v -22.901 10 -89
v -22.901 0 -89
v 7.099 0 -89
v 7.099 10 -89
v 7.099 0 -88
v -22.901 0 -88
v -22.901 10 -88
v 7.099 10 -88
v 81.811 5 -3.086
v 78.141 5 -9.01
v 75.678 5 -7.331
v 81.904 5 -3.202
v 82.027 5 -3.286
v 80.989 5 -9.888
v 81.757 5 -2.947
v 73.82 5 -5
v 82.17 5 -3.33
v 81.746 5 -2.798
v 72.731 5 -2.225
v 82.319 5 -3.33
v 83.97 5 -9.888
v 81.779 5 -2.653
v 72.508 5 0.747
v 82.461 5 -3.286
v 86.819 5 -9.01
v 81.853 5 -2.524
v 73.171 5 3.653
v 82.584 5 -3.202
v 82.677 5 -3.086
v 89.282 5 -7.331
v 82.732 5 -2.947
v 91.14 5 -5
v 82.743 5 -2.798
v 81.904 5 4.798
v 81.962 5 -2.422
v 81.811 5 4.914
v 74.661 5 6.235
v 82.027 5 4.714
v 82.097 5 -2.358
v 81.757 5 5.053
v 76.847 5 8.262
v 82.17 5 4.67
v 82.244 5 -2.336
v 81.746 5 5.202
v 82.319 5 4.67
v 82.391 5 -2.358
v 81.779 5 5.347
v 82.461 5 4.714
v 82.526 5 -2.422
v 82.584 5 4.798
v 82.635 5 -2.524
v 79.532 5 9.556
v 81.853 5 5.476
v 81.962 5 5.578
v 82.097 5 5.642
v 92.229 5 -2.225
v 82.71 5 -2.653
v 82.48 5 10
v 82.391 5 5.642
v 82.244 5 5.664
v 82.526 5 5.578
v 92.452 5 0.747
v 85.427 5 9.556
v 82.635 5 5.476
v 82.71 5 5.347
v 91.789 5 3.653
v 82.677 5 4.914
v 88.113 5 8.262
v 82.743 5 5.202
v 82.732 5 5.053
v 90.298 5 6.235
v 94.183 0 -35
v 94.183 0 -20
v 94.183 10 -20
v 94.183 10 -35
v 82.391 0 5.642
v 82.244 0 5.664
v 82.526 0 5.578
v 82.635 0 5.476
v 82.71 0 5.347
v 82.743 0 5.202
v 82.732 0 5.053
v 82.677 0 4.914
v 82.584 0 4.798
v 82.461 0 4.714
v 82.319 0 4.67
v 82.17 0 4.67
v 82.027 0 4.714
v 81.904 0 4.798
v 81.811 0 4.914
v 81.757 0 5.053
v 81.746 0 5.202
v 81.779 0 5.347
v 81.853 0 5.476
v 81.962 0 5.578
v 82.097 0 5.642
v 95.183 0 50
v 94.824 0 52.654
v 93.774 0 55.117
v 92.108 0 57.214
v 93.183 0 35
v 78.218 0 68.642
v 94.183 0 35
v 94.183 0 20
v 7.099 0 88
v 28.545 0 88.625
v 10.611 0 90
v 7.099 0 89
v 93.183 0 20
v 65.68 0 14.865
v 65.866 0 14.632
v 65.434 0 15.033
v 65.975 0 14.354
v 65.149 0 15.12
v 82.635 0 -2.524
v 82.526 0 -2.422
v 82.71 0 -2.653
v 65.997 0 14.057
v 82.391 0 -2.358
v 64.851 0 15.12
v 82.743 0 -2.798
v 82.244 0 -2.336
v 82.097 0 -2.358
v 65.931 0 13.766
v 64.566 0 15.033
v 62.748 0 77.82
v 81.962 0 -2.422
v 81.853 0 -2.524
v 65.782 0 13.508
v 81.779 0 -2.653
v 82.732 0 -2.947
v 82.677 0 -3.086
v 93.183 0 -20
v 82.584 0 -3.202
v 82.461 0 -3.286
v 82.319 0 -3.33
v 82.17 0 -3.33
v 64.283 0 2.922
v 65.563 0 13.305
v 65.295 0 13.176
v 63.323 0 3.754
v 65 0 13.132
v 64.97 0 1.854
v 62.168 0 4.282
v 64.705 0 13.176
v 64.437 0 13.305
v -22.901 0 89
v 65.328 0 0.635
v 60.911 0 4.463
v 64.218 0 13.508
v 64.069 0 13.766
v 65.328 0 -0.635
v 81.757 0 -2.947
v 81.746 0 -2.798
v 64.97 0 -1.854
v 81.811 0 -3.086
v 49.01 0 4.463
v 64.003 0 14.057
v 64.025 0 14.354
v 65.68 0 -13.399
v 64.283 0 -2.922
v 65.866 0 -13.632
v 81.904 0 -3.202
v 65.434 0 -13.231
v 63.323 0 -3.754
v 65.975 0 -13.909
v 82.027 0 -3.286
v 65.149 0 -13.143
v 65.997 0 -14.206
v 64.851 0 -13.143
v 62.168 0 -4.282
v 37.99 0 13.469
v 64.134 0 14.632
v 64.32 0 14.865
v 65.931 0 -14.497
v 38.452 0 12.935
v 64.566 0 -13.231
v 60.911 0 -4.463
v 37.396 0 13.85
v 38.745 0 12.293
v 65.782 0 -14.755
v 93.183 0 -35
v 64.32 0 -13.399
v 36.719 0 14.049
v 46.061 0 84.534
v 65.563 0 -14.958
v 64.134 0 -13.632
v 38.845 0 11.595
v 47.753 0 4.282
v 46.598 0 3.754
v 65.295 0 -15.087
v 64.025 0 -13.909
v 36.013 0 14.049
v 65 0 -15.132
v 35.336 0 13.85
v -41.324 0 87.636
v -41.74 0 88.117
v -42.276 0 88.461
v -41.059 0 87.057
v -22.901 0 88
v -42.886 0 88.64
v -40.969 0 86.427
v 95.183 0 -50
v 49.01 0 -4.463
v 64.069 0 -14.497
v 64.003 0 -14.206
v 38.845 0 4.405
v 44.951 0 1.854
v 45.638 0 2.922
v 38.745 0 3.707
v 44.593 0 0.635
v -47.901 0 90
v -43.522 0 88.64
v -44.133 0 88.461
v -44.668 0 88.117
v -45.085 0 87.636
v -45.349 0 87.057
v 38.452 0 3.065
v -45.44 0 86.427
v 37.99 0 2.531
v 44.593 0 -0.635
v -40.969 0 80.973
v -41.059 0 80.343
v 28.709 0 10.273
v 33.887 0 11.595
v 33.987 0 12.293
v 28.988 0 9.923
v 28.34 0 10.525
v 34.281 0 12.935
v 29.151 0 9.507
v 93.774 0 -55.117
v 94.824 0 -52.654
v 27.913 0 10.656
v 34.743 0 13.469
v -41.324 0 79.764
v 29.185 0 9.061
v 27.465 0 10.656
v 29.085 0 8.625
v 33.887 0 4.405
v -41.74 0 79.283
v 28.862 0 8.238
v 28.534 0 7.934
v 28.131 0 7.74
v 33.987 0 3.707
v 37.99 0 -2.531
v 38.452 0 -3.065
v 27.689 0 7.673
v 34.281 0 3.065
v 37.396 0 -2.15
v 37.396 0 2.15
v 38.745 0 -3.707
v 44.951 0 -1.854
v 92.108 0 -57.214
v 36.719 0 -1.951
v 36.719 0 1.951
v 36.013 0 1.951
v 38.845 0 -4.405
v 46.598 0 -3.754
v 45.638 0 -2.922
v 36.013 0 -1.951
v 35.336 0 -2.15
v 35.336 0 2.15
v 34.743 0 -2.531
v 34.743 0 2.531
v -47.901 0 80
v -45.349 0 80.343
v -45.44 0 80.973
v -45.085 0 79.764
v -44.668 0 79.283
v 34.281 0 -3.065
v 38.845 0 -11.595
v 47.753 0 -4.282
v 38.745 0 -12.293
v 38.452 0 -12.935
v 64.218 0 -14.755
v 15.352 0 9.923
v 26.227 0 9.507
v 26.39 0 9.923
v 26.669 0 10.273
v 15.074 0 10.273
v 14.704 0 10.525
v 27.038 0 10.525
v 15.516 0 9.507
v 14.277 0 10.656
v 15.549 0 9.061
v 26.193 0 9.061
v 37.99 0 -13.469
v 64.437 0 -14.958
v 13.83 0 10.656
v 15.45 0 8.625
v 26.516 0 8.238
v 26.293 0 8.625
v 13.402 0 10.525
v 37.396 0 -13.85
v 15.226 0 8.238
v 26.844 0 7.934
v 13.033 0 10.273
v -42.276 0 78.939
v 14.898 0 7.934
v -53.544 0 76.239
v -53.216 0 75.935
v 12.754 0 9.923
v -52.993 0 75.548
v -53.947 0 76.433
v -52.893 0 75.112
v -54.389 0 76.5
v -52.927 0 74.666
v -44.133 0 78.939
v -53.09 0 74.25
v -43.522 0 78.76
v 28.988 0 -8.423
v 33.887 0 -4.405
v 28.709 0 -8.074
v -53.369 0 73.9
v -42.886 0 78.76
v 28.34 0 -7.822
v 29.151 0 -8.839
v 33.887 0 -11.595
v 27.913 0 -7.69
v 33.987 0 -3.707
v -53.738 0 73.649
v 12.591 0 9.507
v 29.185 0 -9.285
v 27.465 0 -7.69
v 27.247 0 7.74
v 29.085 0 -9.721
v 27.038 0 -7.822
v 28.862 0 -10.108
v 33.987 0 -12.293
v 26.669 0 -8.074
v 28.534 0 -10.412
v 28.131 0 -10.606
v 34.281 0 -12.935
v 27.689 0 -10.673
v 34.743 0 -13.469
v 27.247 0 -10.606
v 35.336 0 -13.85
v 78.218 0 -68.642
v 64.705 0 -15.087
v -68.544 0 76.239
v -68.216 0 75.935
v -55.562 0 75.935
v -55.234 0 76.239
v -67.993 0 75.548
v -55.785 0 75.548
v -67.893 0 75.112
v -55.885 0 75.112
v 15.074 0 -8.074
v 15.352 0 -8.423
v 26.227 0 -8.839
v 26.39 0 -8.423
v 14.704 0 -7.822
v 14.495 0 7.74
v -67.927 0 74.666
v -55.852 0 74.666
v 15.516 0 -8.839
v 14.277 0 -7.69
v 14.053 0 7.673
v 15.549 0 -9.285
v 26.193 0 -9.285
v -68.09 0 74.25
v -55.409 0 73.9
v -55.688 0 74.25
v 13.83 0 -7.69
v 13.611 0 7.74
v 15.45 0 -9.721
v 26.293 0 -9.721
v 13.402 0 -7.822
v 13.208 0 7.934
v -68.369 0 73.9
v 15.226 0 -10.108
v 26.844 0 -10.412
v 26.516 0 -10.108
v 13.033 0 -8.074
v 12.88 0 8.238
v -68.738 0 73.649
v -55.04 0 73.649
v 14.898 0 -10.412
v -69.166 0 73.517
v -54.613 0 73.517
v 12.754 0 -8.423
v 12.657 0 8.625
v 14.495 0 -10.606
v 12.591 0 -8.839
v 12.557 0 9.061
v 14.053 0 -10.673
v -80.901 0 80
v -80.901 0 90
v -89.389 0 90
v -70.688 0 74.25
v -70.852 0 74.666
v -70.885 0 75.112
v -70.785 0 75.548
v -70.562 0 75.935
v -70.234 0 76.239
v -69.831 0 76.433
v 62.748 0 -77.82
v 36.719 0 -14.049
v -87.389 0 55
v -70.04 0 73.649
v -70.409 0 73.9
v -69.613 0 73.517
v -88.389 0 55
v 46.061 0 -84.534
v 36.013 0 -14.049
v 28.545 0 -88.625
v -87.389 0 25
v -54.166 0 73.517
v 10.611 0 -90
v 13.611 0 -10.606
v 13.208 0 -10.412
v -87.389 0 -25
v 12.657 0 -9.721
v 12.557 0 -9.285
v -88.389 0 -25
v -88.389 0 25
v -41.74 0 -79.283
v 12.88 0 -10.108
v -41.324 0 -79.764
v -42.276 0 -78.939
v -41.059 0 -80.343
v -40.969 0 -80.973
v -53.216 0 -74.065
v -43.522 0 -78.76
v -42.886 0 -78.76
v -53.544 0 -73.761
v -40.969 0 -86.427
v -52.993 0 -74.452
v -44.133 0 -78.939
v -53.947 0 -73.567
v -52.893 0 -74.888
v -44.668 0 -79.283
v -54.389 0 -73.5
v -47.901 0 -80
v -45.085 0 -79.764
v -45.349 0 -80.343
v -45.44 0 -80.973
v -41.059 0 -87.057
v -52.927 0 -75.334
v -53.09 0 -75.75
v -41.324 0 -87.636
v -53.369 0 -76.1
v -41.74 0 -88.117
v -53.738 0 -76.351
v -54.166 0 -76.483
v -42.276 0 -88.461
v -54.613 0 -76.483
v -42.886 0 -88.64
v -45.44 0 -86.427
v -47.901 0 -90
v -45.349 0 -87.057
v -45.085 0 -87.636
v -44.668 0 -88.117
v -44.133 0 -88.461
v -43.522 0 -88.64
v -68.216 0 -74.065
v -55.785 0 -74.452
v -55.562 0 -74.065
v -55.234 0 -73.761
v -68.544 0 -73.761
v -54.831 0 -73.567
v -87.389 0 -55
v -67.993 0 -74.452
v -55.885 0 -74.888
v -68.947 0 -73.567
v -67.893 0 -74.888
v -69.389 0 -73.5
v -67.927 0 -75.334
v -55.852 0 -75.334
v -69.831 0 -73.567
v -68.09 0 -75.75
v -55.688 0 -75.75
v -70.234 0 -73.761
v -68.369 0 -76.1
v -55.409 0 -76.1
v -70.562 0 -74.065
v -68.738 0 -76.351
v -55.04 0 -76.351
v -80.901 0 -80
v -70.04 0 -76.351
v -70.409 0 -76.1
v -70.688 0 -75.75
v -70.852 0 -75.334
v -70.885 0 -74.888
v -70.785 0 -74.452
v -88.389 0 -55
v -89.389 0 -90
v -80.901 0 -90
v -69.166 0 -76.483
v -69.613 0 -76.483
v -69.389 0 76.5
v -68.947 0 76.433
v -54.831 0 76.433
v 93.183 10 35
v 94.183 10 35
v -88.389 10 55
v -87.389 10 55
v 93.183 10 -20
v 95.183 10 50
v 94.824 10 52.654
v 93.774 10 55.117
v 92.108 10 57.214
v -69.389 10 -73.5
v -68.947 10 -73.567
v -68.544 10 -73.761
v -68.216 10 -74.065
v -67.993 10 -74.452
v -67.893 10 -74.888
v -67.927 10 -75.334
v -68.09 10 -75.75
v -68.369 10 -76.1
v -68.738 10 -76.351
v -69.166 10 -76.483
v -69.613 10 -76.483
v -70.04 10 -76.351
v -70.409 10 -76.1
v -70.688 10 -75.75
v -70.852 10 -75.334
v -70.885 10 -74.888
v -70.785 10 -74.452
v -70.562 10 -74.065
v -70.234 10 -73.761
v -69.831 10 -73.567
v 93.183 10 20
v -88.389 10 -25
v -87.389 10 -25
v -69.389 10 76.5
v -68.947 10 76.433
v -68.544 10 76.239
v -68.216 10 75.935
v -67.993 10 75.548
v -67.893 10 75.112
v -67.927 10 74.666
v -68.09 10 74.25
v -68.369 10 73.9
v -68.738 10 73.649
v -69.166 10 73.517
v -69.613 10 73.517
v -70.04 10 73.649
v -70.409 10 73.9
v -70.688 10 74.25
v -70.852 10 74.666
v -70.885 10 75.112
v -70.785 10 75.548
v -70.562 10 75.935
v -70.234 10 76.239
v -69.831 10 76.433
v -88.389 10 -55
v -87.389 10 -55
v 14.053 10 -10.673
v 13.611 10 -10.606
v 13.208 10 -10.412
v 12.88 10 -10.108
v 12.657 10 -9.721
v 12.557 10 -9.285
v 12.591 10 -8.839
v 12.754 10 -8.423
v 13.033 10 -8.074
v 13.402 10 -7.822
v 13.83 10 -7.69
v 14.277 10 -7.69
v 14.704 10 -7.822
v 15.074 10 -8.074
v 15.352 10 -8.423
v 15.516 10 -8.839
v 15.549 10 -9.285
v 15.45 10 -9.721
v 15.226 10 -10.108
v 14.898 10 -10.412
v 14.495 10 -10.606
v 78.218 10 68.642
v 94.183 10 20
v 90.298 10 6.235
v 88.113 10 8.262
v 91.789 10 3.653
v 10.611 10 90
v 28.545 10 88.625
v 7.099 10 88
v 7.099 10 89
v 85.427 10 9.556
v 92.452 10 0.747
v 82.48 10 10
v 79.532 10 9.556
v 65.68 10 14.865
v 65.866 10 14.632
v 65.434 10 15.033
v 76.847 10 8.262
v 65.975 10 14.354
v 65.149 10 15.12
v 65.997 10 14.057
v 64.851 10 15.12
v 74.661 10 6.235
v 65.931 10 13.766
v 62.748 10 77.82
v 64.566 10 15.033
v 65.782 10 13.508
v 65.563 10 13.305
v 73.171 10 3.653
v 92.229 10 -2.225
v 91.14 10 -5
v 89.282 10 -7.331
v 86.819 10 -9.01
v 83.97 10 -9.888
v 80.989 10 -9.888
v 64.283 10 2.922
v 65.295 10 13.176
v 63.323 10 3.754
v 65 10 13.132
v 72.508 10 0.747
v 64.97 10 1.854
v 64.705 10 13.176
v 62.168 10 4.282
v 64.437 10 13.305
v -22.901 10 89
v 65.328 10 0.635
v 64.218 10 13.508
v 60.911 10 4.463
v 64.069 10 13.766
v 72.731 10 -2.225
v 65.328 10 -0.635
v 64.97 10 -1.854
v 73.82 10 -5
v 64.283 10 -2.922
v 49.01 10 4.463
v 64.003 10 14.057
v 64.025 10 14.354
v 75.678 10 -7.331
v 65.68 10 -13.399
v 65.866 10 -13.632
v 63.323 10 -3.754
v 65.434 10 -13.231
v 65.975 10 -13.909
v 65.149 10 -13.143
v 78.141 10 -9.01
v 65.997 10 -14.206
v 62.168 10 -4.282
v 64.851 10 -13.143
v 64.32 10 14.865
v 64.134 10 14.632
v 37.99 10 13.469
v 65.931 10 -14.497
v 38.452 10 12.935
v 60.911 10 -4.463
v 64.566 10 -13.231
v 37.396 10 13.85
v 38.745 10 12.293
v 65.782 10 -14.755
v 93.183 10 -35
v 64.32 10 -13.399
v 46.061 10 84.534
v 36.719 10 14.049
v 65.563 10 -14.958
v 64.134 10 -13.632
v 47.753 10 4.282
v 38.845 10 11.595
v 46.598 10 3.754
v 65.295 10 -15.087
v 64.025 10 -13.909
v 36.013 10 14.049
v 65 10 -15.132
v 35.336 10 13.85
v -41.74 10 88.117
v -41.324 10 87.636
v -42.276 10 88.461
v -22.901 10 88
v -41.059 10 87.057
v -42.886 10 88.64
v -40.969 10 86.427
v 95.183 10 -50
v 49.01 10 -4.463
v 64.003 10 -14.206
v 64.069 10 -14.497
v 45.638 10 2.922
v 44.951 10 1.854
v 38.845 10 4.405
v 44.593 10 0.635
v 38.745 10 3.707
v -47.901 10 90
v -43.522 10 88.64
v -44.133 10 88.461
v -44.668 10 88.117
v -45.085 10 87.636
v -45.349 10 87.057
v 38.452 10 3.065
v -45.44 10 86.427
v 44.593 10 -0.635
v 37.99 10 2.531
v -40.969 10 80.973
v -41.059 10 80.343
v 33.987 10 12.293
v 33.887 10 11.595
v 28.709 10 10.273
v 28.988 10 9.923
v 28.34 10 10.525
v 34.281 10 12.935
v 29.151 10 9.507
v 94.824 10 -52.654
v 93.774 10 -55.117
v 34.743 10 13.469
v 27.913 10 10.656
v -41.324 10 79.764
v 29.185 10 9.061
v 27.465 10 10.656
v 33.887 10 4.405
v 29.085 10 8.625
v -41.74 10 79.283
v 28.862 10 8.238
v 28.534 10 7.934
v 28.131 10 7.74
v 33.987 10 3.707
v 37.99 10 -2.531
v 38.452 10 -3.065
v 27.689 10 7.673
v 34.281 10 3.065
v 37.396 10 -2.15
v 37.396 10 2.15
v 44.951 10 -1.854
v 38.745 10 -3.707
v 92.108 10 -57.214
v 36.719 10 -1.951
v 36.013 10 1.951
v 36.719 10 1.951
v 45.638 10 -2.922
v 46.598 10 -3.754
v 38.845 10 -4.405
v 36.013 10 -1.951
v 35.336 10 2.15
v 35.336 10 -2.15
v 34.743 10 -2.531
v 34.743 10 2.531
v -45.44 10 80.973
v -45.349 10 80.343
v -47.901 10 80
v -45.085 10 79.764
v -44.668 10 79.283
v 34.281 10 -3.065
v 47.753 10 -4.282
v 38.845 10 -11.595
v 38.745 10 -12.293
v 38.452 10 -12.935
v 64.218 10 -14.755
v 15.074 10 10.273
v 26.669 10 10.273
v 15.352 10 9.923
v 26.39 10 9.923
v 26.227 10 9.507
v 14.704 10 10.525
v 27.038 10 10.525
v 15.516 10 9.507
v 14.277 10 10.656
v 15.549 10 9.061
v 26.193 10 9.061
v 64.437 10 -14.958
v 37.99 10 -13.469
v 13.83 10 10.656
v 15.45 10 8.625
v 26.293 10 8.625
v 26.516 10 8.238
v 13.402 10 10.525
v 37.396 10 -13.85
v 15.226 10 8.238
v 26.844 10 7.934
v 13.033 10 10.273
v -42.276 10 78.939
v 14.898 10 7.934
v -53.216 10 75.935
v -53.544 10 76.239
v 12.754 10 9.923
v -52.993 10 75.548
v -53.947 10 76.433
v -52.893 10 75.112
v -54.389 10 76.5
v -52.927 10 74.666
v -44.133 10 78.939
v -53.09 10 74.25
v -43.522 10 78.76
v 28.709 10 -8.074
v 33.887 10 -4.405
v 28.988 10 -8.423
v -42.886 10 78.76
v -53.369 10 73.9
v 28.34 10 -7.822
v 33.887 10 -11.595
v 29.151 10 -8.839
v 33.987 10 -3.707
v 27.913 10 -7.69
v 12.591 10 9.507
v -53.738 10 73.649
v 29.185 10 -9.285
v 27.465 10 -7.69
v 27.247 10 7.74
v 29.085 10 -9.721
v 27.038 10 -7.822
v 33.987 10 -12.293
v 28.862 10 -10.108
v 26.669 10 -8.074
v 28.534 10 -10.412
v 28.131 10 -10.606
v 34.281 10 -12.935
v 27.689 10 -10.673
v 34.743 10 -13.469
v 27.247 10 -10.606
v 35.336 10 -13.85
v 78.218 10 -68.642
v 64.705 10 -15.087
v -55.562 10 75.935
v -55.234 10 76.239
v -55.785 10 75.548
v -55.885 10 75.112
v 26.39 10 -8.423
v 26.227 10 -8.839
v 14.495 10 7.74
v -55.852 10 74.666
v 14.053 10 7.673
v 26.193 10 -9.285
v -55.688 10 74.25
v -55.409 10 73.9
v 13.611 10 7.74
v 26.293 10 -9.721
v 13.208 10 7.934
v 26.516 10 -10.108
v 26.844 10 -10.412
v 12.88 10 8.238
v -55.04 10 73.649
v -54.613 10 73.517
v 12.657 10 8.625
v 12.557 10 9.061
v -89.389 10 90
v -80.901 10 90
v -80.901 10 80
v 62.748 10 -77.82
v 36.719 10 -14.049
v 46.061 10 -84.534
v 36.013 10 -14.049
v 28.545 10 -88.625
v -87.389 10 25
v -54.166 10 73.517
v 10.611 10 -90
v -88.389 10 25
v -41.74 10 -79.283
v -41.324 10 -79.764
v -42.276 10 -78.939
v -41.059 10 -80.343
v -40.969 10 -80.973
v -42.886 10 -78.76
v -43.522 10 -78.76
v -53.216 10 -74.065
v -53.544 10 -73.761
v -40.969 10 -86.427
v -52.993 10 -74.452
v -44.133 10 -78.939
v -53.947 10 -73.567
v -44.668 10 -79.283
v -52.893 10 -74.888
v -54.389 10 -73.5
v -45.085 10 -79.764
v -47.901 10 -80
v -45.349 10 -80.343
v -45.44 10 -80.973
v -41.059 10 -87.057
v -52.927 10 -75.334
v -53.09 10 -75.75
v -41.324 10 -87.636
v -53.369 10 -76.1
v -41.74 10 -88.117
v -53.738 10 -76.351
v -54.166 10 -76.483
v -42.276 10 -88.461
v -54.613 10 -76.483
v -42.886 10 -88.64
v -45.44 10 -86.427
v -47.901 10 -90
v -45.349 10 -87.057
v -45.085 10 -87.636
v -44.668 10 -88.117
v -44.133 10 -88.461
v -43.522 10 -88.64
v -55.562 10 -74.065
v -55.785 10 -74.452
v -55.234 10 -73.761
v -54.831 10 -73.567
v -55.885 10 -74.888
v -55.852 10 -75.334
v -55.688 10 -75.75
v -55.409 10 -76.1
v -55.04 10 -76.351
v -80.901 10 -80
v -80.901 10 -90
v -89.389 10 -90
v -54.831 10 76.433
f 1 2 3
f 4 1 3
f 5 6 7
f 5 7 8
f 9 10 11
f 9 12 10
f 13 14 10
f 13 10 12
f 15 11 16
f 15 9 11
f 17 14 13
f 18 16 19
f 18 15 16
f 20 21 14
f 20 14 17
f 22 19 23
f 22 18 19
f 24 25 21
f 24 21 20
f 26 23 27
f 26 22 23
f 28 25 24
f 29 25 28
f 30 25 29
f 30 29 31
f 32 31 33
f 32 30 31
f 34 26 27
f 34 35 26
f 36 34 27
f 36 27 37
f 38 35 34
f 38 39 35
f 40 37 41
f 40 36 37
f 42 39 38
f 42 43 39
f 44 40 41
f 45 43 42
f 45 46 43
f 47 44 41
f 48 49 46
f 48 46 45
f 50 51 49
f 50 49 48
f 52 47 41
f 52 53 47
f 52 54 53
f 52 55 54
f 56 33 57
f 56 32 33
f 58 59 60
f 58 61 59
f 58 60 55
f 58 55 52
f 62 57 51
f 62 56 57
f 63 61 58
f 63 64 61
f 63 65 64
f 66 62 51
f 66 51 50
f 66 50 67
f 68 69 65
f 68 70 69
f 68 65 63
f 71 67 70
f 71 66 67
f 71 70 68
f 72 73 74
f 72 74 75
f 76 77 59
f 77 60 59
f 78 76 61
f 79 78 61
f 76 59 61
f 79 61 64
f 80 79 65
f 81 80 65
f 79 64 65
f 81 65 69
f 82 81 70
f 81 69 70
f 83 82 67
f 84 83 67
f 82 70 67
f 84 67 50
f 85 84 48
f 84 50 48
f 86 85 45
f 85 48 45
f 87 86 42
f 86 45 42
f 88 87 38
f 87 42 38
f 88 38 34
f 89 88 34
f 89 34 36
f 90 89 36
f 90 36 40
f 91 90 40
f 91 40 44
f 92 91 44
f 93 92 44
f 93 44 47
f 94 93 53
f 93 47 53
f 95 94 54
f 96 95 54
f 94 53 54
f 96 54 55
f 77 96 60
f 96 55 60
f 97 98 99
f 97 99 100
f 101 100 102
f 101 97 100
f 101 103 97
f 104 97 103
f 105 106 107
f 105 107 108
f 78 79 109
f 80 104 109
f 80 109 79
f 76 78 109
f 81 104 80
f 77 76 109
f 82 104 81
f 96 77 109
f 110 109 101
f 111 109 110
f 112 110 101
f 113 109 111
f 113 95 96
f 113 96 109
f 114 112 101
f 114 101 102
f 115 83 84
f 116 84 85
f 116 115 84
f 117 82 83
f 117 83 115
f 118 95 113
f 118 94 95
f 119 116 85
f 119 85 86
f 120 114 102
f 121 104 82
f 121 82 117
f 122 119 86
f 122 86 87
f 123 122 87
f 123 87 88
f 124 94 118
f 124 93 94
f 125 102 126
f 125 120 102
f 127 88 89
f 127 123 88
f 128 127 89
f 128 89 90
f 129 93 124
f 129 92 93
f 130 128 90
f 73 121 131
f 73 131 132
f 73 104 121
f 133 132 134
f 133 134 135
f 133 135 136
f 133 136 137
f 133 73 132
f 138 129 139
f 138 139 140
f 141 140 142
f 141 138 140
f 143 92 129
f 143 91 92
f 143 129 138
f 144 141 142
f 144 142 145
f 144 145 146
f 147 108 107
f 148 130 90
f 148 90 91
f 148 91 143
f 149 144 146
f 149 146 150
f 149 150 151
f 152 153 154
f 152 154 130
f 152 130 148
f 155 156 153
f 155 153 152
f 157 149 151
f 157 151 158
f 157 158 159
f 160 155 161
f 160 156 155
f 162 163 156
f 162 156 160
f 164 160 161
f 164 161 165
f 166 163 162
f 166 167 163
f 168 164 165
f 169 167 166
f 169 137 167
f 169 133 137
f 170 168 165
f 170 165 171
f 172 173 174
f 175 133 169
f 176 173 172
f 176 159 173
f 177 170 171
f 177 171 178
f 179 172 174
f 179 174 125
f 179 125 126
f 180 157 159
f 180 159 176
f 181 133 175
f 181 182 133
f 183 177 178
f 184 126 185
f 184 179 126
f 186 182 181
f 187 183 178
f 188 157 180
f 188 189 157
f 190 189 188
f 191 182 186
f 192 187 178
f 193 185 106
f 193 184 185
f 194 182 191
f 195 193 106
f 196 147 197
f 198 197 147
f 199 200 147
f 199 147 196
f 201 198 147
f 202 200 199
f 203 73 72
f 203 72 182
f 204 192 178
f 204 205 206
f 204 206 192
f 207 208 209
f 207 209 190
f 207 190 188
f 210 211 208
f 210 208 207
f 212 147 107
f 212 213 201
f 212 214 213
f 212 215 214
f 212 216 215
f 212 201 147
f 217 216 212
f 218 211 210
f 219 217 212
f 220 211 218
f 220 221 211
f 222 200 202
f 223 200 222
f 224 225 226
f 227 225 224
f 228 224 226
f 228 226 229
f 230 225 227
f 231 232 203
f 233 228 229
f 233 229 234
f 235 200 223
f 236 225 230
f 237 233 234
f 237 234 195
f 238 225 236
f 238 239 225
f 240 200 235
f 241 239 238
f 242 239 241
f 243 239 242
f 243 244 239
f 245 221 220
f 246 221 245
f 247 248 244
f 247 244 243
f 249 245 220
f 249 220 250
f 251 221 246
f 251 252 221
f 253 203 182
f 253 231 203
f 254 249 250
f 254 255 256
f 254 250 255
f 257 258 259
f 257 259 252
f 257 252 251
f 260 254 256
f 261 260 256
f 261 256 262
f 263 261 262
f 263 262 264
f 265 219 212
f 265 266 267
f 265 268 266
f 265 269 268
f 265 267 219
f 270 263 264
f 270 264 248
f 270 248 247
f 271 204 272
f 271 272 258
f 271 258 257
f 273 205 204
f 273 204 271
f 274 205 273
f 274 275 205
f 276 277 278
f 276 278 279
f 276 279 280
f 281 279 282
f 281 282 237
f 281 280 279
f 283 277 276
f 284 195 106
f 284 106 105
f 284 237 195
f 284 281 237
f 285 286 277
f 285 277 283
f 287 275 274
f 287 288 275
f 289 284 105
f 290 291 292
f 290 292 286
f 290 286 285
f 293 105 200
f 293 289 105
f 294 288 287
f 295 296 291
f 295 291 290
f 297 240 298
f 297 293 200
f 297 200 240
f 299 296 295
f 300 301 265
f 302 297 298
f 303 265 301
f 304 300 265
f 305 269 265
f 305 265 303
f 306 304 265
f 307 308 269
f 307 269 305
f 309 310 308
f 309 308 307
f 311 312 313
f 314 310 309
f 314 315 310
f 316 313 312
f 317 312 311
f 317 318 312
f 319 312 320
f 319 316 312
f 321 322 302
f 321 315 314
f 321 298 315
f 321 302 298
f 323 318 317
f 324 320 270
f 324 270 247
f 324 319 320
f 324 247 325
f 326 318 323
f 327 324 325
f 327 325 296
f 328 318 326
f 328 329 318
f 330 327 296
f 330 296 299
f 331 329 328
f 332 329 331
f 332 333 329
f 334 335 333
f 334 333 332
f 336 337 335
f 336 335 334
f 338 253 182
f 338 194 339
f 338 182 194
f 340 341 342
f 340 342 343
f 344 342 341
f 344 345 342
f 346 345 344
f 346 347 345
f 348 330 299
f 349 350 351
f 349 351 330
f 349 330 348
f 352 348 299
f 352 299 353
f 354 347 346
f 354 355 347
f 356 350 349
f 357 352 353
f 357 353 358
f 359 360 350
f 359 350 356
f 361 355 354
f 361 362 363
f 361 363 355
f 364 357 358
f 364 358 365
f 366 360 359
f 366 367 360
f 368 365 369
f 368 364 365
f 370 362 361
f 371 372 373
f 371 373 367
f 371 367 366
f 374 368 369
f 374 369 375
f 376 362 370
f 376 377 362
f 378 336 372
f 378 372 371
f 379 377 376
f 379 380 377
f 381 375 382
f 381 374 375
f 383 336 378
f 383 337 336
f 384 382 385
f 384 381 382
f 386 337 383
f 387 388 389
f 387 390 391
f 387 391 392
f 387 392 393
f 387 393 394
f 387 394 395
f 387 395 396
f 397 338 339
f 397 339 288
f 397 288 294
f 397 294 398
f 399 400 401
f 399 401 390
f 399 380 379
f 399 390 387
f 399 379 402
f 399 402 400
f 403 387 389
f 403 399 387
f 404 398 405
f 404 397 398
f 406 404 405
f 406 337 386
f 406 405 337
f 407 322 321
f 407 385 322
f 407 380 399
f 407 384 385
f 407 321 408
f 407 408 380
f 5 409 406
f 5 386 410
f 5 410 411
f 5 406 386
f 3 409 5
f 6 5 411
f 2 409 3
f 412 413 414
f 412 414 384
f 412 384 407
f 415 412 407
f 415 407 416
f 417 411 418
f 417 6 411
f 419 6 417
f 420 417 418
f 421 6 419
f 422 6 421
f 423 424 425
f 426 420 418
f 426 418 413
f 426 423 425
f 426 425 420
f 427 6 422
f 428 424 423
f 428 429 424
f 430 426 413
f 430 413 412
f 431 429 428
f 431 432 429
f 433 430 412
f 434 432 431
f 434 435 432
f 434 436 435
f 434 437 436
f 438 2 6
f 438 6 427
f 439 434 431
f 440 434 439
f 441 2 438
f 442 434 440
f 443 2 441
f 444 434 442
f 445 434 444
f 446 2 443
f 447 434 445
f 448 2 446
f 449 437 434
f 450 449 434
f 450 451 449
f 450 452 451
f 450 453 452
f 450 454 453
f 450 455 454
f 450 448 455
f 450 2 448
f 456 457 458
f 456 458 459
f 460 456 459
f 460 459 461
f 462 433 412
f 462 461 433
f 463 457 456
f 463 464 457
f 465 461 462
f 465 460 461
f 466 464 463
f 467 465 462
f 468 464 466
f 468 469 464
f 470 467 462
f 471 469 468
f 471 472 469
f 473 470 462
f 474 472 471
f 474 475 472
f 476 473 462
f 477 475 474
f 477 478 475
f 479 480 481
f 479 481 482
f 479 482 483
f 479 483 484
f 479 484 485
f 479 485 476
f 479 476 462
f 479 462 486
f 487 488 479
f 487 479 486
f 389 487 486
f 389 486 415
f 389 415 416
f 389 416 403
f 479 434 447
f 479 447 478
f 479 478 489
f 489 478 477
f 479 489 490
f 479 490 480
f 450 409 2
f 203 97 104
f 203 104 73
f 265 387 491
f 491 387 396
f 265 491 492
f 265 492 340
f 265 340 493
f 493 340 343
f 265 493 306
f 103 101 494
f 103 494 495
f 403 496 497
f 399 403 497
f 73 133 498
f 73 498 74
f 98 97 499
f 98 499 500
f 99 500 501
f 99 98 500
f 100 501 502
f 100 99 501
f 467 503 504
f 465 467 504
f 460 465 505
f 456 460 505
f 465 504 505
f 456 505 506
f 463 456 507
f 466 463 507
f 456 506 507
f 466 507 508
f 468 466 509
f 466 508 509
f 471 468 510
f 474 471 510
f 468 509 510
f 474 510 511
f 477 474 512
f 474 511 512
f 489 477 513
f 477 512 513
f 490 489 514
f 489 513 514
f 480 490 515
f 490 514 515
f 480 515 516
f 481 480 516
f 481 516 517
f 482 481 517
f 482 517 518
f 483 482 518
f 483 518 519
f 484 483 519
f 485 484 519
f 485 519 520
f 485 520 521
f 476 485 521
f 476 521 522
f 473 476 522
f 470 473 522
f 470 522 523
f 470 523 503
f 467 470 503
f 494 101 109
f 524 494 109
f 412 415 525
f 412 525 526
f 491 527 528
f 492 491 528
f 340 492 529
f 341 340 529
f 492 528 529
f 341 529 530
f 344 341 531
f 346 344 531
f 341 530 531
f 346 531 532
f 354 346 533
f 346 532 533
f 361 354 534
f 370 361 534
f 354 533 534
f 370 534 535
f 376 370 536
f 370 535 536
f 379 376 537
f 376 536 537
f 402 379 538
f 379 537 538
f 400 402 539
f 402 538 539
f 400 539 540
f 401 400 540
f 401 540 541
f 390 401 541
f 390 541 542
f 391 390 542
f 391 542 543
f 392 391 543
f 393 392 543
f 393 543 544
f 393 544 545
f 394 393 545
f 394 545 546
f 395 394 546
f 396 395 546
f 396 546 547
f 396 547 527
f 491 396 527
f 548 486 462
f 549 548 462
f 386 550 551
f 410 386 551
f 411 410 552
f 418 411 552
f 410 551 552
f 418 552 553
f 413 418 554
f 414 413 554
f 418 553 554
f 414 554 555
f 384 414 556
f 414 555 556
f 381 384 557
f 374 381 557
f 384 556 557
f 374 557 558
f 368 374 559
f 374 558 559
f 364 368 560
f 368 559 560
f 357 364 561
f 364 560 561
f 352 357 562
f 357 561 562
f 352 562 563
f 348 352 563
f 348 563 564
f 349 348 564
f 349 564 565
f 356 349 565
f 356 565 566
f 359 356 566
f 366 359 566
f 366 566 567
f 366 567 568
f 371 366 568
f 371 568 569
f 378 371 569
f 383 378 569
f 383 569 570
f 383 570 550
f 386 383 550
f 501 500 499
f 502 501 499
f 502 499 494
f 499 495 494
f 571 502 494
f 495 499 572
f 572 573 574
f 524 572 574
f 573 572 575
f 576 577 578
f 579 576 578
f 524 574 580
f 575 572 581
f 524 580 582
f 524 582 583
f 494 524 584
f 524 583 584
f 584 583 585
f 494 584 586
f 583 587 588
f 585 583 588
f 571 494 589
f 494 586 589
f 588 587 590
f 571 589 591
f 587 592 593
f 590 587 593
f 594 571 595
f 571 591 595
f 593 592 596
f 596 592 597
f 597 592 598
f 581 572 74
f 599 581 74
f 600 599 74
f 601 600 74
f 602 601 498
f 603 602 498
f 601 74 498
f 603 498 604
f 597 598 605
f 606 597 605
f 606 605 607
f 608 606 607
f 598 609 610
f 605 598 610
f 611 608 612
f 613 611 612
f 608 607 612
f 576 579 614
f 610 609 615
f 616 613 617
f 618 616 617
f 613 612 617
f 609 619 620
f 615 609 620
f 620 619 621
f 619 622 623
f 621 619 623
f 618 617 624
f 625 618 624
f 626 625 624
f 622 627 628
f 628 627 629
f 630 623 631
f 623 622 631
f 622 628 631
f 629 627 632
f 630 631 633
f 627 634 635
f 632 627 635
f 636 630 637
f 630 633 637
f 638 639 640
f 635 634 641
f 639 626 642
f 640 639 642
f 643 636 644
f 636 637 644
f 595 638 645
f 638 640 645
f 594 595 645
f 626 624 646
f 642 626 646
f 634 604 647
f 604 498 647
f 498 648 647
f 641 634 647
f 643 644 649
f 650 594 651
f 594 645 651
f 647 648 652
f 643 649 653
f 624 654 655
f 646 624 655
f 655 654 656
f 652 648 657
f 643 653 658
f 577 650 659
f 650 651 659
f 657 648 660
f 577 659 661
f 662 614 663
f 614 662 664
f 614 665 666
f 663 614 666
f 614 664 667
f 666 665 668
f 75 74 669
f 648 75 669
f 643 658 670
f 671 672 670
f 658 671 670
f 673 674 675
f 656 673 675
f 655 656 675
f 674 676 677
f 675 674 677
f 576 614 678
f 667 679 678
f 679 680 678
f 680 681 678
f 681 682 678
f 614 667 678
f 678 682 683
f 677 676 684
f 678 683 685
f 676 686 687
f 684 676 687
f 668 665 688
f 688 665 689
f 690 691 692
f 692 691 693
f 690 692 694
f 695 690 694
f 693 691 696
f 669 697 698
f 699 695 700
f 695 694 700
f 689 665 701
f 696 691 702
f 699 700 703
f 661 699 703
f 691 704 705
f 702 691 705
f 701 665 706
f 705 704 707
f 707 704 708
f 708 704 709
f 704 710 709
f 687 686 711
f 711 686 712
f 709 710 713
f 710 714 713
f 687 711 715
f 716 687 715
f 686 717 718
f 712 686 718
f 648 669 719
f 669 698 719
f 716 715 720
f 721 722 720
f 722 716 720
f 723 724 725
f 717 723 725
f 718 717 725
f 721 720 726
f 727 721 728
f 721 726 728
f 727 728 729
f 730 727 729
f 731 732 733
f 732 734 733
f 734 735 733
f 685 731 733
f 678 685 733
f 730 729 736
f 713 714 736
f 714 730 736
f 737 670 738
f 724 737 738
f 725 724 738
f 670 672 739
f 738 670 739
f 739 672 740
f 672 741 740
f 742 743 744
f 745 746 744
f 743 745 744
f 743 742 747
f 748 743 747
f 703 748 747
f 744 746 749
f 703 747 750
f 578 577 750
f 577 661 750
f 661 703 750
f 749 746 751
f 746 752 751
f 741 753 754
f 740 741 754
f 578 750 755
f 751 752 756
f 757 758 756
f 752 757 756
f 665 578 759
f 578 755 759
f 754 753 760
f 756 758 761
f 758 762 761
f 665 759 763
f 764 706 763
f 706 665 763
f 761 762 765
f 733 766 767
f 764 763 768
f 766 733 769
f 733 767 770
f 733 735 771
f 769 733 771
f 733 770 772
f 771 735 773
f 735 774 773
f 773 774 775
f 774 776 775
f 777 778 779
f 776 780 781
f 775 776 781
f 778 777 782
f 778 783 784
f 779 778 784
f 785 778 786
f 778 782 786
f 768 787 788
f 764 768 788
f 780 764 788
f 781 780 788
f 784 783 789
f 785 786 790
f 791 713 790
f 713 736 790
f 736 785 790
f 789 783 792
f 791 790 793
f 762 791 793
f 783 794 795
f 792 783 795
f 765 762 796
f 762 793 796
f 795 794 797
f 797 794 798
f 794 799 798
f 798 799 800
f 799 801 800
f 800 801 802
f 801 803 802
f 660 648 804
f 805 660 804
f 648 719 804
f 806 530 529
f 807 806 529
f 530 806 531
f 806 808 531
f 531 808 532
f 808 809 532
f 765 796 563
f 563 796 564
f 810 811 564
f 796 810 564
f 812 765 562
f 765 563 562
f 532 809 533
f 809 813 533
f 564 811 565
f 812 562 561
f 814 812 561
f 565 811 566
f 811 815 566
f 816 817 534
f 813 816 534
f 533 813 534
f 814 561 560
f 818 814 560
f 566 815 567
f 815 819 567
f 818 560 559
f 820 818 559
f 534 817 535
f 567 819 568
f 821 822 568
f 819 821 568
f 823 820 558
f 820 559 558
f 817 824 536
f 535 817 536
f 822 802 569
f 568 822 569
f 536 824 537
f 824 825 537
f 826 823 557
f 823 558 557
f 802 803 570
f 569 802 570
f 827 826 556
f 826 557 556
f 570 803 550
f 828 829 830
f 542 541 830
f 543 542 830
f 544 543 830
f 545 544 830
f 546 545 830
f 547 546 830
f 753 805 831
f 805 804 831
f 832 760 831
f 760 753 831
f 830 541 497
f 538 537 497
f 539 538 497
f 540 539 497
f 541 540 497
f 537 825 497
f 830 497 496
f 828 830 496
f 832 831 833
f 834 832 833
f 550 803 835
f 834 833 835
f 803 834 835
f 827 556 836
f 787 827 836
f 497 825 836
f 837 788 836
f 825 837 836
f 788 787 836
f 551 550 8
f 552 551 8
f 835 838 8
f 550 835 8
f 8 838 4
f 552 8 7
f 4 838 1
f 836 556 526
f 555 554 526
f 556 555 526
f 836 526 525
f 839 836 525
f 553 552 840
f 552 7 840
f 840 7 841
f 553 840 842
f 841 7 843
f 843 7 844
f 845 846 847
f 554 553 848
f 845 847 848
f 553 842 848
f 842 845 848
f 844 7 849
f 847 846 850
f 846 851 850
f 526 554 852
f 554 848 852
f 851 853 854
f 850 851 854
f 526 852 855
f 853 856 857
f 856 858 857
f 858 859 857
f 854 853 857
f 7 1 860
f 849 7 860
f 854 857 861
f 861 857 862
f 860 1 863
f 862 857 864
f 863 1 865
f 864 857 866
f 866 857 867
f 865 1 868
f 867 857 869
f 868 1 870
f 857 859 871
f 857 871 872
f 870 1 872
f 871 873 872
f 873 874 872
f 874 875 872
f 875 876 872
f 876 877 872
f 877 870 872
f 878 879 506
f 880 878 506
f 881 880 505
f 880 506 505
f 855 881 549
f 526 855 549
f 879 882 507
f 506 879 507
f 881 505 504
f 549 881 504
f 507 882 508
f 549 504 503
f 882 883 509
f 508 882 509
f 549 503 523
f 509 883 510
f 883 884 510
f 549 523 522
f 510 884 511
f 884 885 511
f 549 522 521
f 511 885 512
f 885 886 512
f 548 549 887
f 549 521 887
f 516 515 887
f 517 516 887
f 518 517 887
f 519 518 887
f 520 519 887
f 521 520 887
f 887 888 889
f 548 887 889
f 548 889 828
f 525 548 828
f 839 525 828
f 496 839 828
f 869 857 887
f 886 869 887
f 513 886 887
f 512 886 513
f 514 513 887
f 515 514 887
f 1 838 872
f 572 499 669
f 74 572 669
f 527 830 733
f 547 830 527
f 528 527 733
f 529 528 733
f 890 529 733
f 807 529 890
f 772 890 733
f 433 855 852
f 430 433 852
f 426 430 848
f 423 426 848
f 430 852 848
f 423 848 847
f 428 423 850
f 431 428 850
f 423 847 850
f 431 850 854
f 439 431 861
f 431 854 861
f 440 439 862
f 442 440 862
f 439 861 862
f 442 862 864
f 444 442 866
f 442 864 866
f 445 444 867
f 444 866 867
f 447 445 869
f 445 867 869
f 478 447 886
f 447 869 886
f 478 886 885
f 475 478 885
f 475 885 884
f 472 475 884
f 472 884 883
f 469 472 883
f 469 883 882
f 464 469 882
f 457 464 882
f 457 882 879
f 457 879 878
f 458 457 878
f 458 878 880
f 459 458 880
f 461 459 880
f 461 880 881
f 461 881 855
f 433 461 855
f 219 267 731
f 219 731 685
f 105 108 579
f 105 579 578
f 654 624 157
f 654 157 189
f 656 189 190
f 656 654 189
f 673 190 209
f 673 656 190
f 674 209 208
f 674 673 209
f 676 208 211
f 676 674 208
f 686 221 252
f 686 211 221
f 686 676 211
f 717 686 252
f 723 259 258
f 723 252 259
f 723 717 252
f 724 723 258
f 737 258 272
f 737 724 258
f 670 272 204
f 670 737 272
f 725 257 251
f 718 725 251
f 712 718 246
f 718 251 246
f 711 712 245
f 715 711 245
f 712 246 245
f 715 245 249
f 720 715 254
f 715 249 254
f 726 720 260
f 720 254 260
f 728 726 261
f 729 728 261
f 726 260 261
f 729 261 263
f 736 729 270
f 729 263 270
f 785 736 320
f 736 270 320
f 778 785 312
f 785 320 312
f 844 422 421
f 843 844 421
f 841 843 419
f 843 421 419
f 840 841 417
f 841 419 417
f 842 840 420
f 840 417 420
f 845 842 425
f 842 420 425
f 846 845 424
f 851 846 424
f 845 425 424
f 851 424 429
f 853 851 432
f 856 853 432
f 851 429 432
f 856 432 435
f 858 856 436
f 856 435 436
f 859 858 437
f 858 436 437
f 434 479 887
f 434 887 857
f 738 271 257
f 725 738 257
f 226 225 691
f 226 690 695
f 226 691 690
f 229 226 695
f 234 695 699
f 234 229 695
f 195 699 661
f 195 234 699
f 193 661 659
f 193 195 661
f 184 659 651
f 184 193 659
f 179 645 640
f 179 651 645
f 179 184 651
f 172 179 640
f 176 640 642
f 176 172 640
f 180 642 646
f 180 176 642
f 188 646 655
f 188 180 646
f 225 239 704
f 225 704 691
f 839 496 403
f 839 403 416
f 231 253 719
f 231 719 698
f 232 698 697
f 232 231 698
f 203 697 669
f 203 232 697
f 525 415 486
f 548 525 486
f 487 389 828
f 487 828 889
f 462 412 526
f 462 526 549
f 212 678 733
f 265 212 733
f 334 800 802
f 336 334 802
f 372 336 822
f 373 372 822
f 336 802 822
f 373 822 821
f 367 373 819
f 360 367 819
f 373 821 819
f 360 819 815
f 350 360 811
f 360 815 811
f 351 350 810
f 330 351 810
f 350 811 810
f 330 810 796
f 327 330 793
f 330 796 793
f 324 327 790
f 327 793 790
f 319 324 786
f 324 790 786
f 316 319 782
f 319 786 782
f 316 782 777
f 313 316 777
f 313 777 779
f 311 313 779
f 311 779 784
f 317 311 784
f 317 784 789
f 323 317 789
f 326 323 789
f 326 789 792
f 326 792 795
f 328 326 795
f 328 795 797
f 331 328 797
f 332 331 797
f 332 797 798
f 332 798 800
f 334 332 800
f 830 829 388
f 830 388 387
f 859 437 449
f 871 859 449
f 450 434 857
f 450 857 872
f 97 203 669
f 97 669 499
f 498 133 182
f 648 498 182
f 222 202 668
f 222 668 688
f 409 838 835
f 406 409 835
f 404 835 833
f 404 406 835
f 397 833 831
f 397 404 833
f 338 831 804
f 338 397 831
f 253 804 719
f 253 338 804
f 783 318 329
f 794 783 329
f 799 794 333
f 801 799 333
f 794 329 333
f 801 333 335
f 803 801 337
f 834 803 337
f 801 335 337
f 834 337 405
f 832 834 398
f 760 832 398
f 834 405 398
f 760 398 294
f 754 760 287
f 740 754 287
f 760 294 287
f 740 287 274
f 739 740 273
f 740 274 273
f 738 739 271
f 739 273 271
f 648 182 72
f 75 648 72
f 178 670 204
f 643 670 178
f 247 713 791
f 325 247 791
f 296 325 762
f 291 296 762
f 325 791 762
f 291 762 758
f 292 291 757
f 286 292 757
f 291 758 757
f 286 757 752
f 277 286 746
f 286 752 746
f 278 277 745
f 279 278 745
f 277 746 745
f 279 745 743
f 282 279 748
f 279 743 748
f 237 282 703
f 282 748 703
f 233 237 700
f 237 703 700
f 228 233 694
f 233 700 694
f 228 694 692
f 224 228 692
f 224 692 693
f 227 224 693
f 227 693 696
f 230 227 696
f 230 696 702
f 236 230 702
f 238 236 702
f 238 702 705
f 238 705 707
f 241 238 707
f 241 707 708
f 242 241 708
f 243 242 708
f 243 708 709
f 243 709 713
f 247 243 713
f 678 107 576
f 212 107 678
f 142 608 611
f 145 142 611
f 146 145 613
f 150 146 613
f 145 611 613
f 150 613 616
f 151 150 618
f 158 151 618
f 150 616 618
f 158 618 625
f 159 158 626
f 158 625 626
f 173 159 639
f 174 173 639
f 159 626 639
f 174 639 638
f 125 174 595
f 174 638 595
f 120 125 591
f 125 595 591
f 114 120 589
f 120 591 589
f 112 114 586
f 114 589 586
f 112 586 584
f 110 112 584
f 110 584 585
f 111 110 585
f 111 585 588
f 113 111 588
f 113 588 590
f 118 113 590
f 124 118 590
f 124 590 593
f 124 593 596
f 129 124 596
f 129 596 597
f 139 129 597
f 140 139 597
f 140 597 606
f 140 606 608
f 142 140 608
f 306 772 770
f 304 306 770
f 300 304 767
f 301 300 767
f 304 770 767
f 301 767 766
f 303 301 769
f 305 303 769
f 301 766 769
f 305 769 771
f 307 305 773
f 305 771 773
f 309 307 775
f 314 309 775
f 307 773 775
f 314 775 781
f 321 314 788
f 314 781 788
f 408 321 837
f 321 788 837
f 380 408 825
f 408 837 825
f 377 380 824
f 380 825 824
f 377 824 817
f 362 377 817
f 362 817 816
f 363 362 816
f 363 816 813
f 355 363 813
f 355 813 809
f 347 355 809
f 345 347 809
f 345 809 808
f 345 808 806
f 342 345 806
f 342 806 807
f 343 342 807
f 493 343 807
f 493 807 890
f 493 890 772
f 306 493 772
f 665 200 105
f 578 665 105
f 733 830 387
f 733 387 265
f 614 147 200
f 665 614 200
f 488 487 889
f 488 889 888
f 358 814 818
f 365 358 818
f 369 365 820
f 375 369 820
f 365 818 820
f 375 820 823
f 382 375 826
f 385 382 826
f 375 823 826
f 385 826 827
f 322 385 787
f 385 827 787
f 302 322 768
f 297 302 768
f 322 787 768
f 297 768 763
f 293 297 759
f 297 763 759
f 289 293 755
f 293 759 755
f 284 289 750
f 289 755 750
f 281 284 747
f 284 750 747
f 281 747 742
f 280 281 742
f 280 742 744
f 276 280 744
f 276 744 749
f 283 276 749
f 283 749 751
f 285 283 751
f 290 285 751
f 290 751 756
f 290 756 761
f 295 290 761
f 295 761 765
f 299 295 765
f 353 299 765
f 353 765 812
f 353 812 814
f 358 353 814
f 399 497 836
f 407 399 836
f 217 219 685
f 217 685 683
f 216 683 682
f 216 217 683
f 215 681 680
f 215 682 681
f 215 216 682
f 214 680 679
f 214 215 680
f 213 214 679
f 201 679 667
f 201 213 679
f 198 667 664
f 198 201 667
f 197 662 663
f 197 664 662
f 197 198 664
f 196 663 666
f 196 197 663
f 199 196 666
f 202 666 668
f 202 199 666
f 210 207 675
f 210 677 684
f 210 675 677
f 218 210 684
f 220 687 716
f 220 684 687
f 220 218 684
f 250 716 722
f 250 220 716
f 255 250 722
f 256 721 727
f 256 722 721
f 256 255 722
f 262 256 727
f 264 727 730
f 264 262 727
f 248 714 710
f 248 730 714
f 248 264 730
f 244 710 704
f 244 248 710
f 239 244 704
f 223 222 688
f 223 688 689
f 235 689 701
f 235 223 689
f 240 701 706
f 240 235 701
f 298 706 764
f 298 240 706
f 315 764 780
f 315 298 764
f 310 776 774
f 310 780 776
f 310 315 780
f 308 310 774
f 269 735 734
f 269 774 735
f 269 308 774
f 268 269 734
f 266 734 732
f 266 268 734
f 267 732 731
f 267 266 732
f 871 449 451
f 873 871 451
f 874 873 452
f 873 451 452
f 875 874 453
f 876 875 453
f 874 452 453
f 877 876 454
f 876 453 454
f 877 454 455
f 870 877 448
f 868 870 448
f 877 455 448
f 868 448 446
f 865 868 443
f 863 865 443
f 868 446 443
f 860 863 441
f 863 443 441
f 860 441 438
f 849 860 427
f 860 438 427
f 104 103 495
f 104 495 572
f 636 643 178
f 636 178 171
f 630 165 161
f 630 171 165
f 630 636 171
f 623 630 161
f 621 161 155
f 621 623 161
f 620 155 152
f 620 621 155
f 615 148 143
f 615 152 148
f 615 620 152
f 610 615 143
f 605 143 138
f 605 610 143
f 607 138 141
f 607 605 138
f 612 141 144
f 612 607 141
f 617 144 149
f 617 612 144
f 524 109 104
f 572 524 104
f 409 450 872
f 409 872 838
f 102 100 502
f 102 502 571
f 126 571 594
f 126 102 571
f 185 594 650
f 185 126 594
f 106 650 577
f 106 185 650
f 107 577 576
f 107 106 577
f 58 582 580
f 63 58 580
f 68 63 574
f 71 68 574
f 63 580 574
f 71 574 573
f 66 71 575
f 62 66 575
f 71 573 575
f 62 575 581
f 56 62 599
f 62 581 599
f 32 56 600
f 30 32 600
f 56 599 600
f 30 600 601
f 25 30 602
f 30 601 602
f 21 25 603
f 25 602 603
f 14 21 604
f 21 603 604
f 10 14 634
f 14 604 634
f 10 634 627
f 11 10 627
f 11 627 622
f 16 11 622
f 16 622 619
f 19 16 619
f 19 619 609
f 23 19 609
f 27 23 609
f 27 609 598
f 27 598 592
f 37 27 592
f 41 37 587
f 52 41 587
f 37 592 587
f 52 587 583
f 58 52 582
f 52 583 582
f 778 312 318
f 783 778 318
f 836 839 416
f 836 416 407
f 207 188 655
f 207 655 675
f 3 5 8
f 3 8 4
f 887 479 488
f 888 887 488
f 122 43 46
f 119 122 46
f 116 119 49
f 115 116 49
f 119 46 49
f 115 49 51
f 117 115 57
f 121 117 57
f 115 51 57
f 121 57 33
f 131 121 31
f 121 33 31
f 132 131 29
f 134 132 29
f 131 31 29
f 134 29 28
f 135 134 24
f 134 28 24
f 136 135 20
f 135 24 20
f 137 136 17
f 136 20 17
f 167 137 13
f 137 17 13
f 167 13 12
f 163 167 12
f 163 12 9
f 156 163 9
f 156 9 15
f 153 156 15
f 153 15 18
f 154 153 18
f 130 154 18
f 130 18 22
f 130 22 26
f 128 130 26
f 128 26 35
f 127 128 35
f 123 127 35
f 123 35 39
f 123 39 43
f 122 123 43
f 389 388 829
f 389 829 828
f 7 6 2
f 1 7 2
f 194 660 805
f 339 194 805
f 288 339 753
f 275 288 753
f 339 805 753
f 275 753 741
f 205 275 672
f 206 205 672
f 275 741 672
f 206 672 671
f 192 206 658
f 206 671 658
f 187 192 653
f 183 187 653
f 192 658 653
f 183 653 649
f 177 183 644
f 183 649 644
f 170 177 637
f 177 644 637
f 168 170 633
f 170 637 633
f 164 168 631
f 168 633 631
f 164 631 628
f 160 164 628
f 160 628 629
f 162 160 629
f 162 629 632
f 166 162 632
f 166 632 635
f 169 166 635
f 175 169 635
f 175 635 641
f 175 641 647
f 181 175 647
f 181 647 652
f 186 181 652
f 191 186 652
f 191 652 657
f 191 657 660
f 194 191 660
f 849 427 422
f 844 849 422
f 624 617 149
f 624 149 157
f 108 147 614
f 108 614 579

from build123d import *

# Parameters (mm, degrees)
BOSS_EXTRUDE1_DEPTH = 10
SKETCH2_R           = 1
SKETCH2_R_2         = 1.5
SKETCH2_W           = 33
SKETCH2_H           = 10
CUT_EXTRUDE2_DEPTH  = 15
SKETCH3_R           = 10
CUT_EXTRUDE3_DEPTH  = 5
CUT_EXTRUDE4_DEPTH  = 15
SKETCH5_W           = 30
SKETCH5_H           = 1
SKETCH5_W_2         = 1
SKETCH5_H_2         = 30
SKETCH5_H_3         = 15
CUT_EXTRUDE6_DEPTH  = 15
SKETCH6_R           = 0.5
CUT_EXTRUDE7_DEPTH  = 15
SKETCH7_R           = 1.5
CUT_EXTRUDE8_DEPTH  = 132.376296717


with BuildPart() as part:
    # Sketch1 → Boss-Extrude1 (new body)
    with BuildSketch(Plane(origin=(0, 0, 0), x_dir=(1, 0, 0), z_dir=(0, 1, 0))):
        with BuildLine():
            Line((-89.389143795, -90), (-89.389143795, 90))
            Line((-89.389143795, 90), (10.610856205, 90))
            ThreePointArc((10.610856205, 90), (54.533138364, 81.496268076), (92.107774725, 57.214031174))
            ThreePointArc((92.107774725, 57.214031174), (94.381847518, 53.920998768), (95.182620993, 50))
            Line((95.182620993, 50), (95.182620993, -50))
            ThreePointArc((95.182620993, -50), (94.381847518, -53.920998768), (92.107774725, -57.214031174))
            ThreePointArc((92.107774725, -57.214031174), (54.533138364, -81.496268076), (10.610856205, -90))
            Line((10.610856205, -90), (-89.389143795, -90))
        make_face()
    extrude(amount=BOSS_EXTRUDE1_DEPTH)

    # Sketch2 → Cut-Extrude2 (cut, symmetric)
    with BuildSketch(Plane(origin=(0, 10, 0), x_dir=(1, 0, 0), z_dir=(0, 1, 0))):
        with Locations(Location((65, 14.131573434, 0), (0, 0, 90))):
            Circle(SKETCH2_R)
        with Locations(Location((27.688972694, 9.173126615, 0), (0, 0, 90))):
            Circle(SKETCH2_R_2)
        with Locations(Location((14.053243942, 9.173126615, 0), (0, 0, 90))):
            Circle(SKETCH2_R_2)
        with Locations(Location((14.053243942, -9.173126615, 0), (0, 0, 90))):
            Circle(SKETCH2_R_2)
        with Locations(Location((27.688972694, -9.173126615, 0), (0, 0, 90))):
            Circle(SKETCH2_R_2)
        with Locations(Location((65, -14.131573434, 0), (0, 0, 90))):
            Circle(SKETCH2_R)
        with BuildLine():
            Line((-40.968894473, 86.42714575), (-40.968894473, 80.97285425))
            ThreePointArc((-40.968894473, 80.97285425), (-43.204350858, 78.737397865), (-45.439807243, 80.97285425))
            Line((-45.439807243, 80.97285425), (-45.439807243, 86.42714575))
            ThreePointArc((-45.439807243, 86.42714575), (-43.204350858, 88.662602135), (-40.968894473, 86.42714575))
        make_face()
        with BuildLine():
            Line((38.845478036, 11.594873944), (38.845478036, 4.405126056))
            ThreePointArc((38.845478036, 4.405126056), (36.366254627, 1.925902647), (33.887031217, 4.405126056))
            Line((33.887031217, 4.405126056), (33.887031217, 11.594873944))
            ThreePointArc((33.887031217, 11.594873944), (36.366254627, 14.074097353), (38.845478036, 11.594873944))
        make_face()
        with Locations((-64.401012641, 85)):
            Rectangle(SKETCH2_W, SKETCH2_H)
        with BuildLine():
            Line((38.845478036, -11.594873944), (38.845478036, -4.405126056))
            ThreePointArc((38.845478036, -4.405126056), (36.366254627, -1.925902647), (33.887031217, -4.405126056))
            Line((33.887031217, -4.405126056), (33.887031217, -11.594873944))
            ThreePointArc((33.887031217, -11.594873944), (36.366254627, -14.074097353), (38.845478036, -11.594873944))
        make_face()
        with BuildLine():
            Line((-40.968894473, -86.42714575), (-40.968894473, -80.97285425))
            ThreePointArc((-40.968894473, -80.97285425), (-43.204350858, -78.737397865), (-45.439807243, -80.97285425))
            Line((-45.439807243, -80.97285425), (-45.439807243, -86.42714575))
            ThreePointArc((-45.439807243, -86.42714575), (-43.204350858, -88.662602135), (-40.968894473, -86.42714575))
        make_face()
        with Locations((-64.401012641, -85)):
            Rectangle(SKETCH2_W, SKETCH2_H)
    extrude(amount=CUT_EXTRUDE2_DEPTH, both=True, mode=Mode.SUBTRACT)

    # Sketch3 → Cut-Extrude3 (cut, symmetric)
    with BuildSketch(Plane(origin=(0, 10, 0), x_dir=(1, 0, 0), z_dir=(0, 1, 0))):
        with Locations(Location((82.479810043, 0, 0), (0, 0, 270))):
            Circle(SKETCH3_R)
    extrude(amount=CUT_EXTRUDE3_DEPTH, both=True, mode=Mode.SUBTRACT)

    # Sketch4 → Cut-Extrude4 (cut, symmetric)
    with BuildSketch(Plane(origin=(0, 10, 0), x_dir=(1, 0, 0), z_dir=(0, 1, 0))):
        with BuildLine():
            Line((49.010294015, 4.462602137), (60.91056638, 4.462602137))
            ThreePointArc((60.91056638, 4.462602137), (65.373168517, 0), (60.91056638, -4.462602137))
            Line((60.91056638, -4.462602137), (49.010294015, -4.462602137))
            ThreePointArc((49.010294015, -4.462602137), (44.547691878, 0), (49.010294015, 4.462602137))
        make_face()
    extrude(amount=CUT_EXTRUDE4_DEPTH, both=True, mode=Mode.SUBTRACT)

    # Sketch5 → Cut-Extrude6 (cut, symmetric)
    with BuildSketch(Plane(origin=(0, 10, 0), x_dir=(1, 0, 0), z_dir=(0, 1, 0))):
        with Locations((-7.901012641, 88.5)):
            Rectangle(SKETCH5_W, SKETCH5_H)
        with Locations((-87.889143795, 40)):
            Rectangle(SKETCH5_W_2, SKETCH5_H_2)
        with Locations((93.682620993, 27.5)):
            Rectangle(SKETCH5_W_2, SKETCH5_H_3)
        with Locations((93.682620993, -27.5)):
            Rectangle(SKETCH5_W_2, SKETCH5_H_3)
        with Locations((-7.901012641, -88.5)):
            Rectangle(SKETCH5_W, SKETCH5_H)
        with Locations((-87.889143795, -40)):
            Rectangle(SKETCH5_W_2, SKETCH5_H_2)
    extrude(amount=CUT_EXTRUDE6_DEPTH, both=True, mode=Mode.SUBTRACT)

    # Sketch6 → Cut-Extrude7 (cut, symmetric)
    with BuildSketch(Plane(origin=(0, 5, 0), x_dir=(1, 0, 0), z_dir=(0, 1, 0))):
        with Locations(Location((82.244112685, 2.835581496, 0), (0, 0, 270))):
            Circle(SKETCH6_R)
        with Locations(Location((82.244112685, -5.164418504, 0), (0, 0, 270))):
            Circle(SKETCH6_R)
    extrude(amount=CUT_EXTRUDE7_DEPTH, both=True, mode=Mode.SUBTRACT)

    # Sketch7 → Cut-Extrude8 (cut, through all)
    with BuildSketch(Plane(origin=(0, 10, 0), x_dir=(1, 0, 0), z_dir=(0, 1, 0))):
        with Locations(Location((-69.389143795, 75, 0), (0, 0, 270))):
            Circle(SKETCH7_R)
        with Locations(Location((-54.389143795, 75, 0), (0, 0, 270))):
            Circle(SKETCH7_R)
        with Locations(Location((-69.389143795, -75, 0), (0, 0, 270))):
            Circle(SKETCH7_R)
        with Locations(Location((-54.389143795, -75, 0), (0, 0, 270))):
            Circle(SKETCH7_R)
    extrude(amount=-CUT_EXTRUDE8_DEPTH, mode=Mode.SUBTRACT)


solid = part.part
